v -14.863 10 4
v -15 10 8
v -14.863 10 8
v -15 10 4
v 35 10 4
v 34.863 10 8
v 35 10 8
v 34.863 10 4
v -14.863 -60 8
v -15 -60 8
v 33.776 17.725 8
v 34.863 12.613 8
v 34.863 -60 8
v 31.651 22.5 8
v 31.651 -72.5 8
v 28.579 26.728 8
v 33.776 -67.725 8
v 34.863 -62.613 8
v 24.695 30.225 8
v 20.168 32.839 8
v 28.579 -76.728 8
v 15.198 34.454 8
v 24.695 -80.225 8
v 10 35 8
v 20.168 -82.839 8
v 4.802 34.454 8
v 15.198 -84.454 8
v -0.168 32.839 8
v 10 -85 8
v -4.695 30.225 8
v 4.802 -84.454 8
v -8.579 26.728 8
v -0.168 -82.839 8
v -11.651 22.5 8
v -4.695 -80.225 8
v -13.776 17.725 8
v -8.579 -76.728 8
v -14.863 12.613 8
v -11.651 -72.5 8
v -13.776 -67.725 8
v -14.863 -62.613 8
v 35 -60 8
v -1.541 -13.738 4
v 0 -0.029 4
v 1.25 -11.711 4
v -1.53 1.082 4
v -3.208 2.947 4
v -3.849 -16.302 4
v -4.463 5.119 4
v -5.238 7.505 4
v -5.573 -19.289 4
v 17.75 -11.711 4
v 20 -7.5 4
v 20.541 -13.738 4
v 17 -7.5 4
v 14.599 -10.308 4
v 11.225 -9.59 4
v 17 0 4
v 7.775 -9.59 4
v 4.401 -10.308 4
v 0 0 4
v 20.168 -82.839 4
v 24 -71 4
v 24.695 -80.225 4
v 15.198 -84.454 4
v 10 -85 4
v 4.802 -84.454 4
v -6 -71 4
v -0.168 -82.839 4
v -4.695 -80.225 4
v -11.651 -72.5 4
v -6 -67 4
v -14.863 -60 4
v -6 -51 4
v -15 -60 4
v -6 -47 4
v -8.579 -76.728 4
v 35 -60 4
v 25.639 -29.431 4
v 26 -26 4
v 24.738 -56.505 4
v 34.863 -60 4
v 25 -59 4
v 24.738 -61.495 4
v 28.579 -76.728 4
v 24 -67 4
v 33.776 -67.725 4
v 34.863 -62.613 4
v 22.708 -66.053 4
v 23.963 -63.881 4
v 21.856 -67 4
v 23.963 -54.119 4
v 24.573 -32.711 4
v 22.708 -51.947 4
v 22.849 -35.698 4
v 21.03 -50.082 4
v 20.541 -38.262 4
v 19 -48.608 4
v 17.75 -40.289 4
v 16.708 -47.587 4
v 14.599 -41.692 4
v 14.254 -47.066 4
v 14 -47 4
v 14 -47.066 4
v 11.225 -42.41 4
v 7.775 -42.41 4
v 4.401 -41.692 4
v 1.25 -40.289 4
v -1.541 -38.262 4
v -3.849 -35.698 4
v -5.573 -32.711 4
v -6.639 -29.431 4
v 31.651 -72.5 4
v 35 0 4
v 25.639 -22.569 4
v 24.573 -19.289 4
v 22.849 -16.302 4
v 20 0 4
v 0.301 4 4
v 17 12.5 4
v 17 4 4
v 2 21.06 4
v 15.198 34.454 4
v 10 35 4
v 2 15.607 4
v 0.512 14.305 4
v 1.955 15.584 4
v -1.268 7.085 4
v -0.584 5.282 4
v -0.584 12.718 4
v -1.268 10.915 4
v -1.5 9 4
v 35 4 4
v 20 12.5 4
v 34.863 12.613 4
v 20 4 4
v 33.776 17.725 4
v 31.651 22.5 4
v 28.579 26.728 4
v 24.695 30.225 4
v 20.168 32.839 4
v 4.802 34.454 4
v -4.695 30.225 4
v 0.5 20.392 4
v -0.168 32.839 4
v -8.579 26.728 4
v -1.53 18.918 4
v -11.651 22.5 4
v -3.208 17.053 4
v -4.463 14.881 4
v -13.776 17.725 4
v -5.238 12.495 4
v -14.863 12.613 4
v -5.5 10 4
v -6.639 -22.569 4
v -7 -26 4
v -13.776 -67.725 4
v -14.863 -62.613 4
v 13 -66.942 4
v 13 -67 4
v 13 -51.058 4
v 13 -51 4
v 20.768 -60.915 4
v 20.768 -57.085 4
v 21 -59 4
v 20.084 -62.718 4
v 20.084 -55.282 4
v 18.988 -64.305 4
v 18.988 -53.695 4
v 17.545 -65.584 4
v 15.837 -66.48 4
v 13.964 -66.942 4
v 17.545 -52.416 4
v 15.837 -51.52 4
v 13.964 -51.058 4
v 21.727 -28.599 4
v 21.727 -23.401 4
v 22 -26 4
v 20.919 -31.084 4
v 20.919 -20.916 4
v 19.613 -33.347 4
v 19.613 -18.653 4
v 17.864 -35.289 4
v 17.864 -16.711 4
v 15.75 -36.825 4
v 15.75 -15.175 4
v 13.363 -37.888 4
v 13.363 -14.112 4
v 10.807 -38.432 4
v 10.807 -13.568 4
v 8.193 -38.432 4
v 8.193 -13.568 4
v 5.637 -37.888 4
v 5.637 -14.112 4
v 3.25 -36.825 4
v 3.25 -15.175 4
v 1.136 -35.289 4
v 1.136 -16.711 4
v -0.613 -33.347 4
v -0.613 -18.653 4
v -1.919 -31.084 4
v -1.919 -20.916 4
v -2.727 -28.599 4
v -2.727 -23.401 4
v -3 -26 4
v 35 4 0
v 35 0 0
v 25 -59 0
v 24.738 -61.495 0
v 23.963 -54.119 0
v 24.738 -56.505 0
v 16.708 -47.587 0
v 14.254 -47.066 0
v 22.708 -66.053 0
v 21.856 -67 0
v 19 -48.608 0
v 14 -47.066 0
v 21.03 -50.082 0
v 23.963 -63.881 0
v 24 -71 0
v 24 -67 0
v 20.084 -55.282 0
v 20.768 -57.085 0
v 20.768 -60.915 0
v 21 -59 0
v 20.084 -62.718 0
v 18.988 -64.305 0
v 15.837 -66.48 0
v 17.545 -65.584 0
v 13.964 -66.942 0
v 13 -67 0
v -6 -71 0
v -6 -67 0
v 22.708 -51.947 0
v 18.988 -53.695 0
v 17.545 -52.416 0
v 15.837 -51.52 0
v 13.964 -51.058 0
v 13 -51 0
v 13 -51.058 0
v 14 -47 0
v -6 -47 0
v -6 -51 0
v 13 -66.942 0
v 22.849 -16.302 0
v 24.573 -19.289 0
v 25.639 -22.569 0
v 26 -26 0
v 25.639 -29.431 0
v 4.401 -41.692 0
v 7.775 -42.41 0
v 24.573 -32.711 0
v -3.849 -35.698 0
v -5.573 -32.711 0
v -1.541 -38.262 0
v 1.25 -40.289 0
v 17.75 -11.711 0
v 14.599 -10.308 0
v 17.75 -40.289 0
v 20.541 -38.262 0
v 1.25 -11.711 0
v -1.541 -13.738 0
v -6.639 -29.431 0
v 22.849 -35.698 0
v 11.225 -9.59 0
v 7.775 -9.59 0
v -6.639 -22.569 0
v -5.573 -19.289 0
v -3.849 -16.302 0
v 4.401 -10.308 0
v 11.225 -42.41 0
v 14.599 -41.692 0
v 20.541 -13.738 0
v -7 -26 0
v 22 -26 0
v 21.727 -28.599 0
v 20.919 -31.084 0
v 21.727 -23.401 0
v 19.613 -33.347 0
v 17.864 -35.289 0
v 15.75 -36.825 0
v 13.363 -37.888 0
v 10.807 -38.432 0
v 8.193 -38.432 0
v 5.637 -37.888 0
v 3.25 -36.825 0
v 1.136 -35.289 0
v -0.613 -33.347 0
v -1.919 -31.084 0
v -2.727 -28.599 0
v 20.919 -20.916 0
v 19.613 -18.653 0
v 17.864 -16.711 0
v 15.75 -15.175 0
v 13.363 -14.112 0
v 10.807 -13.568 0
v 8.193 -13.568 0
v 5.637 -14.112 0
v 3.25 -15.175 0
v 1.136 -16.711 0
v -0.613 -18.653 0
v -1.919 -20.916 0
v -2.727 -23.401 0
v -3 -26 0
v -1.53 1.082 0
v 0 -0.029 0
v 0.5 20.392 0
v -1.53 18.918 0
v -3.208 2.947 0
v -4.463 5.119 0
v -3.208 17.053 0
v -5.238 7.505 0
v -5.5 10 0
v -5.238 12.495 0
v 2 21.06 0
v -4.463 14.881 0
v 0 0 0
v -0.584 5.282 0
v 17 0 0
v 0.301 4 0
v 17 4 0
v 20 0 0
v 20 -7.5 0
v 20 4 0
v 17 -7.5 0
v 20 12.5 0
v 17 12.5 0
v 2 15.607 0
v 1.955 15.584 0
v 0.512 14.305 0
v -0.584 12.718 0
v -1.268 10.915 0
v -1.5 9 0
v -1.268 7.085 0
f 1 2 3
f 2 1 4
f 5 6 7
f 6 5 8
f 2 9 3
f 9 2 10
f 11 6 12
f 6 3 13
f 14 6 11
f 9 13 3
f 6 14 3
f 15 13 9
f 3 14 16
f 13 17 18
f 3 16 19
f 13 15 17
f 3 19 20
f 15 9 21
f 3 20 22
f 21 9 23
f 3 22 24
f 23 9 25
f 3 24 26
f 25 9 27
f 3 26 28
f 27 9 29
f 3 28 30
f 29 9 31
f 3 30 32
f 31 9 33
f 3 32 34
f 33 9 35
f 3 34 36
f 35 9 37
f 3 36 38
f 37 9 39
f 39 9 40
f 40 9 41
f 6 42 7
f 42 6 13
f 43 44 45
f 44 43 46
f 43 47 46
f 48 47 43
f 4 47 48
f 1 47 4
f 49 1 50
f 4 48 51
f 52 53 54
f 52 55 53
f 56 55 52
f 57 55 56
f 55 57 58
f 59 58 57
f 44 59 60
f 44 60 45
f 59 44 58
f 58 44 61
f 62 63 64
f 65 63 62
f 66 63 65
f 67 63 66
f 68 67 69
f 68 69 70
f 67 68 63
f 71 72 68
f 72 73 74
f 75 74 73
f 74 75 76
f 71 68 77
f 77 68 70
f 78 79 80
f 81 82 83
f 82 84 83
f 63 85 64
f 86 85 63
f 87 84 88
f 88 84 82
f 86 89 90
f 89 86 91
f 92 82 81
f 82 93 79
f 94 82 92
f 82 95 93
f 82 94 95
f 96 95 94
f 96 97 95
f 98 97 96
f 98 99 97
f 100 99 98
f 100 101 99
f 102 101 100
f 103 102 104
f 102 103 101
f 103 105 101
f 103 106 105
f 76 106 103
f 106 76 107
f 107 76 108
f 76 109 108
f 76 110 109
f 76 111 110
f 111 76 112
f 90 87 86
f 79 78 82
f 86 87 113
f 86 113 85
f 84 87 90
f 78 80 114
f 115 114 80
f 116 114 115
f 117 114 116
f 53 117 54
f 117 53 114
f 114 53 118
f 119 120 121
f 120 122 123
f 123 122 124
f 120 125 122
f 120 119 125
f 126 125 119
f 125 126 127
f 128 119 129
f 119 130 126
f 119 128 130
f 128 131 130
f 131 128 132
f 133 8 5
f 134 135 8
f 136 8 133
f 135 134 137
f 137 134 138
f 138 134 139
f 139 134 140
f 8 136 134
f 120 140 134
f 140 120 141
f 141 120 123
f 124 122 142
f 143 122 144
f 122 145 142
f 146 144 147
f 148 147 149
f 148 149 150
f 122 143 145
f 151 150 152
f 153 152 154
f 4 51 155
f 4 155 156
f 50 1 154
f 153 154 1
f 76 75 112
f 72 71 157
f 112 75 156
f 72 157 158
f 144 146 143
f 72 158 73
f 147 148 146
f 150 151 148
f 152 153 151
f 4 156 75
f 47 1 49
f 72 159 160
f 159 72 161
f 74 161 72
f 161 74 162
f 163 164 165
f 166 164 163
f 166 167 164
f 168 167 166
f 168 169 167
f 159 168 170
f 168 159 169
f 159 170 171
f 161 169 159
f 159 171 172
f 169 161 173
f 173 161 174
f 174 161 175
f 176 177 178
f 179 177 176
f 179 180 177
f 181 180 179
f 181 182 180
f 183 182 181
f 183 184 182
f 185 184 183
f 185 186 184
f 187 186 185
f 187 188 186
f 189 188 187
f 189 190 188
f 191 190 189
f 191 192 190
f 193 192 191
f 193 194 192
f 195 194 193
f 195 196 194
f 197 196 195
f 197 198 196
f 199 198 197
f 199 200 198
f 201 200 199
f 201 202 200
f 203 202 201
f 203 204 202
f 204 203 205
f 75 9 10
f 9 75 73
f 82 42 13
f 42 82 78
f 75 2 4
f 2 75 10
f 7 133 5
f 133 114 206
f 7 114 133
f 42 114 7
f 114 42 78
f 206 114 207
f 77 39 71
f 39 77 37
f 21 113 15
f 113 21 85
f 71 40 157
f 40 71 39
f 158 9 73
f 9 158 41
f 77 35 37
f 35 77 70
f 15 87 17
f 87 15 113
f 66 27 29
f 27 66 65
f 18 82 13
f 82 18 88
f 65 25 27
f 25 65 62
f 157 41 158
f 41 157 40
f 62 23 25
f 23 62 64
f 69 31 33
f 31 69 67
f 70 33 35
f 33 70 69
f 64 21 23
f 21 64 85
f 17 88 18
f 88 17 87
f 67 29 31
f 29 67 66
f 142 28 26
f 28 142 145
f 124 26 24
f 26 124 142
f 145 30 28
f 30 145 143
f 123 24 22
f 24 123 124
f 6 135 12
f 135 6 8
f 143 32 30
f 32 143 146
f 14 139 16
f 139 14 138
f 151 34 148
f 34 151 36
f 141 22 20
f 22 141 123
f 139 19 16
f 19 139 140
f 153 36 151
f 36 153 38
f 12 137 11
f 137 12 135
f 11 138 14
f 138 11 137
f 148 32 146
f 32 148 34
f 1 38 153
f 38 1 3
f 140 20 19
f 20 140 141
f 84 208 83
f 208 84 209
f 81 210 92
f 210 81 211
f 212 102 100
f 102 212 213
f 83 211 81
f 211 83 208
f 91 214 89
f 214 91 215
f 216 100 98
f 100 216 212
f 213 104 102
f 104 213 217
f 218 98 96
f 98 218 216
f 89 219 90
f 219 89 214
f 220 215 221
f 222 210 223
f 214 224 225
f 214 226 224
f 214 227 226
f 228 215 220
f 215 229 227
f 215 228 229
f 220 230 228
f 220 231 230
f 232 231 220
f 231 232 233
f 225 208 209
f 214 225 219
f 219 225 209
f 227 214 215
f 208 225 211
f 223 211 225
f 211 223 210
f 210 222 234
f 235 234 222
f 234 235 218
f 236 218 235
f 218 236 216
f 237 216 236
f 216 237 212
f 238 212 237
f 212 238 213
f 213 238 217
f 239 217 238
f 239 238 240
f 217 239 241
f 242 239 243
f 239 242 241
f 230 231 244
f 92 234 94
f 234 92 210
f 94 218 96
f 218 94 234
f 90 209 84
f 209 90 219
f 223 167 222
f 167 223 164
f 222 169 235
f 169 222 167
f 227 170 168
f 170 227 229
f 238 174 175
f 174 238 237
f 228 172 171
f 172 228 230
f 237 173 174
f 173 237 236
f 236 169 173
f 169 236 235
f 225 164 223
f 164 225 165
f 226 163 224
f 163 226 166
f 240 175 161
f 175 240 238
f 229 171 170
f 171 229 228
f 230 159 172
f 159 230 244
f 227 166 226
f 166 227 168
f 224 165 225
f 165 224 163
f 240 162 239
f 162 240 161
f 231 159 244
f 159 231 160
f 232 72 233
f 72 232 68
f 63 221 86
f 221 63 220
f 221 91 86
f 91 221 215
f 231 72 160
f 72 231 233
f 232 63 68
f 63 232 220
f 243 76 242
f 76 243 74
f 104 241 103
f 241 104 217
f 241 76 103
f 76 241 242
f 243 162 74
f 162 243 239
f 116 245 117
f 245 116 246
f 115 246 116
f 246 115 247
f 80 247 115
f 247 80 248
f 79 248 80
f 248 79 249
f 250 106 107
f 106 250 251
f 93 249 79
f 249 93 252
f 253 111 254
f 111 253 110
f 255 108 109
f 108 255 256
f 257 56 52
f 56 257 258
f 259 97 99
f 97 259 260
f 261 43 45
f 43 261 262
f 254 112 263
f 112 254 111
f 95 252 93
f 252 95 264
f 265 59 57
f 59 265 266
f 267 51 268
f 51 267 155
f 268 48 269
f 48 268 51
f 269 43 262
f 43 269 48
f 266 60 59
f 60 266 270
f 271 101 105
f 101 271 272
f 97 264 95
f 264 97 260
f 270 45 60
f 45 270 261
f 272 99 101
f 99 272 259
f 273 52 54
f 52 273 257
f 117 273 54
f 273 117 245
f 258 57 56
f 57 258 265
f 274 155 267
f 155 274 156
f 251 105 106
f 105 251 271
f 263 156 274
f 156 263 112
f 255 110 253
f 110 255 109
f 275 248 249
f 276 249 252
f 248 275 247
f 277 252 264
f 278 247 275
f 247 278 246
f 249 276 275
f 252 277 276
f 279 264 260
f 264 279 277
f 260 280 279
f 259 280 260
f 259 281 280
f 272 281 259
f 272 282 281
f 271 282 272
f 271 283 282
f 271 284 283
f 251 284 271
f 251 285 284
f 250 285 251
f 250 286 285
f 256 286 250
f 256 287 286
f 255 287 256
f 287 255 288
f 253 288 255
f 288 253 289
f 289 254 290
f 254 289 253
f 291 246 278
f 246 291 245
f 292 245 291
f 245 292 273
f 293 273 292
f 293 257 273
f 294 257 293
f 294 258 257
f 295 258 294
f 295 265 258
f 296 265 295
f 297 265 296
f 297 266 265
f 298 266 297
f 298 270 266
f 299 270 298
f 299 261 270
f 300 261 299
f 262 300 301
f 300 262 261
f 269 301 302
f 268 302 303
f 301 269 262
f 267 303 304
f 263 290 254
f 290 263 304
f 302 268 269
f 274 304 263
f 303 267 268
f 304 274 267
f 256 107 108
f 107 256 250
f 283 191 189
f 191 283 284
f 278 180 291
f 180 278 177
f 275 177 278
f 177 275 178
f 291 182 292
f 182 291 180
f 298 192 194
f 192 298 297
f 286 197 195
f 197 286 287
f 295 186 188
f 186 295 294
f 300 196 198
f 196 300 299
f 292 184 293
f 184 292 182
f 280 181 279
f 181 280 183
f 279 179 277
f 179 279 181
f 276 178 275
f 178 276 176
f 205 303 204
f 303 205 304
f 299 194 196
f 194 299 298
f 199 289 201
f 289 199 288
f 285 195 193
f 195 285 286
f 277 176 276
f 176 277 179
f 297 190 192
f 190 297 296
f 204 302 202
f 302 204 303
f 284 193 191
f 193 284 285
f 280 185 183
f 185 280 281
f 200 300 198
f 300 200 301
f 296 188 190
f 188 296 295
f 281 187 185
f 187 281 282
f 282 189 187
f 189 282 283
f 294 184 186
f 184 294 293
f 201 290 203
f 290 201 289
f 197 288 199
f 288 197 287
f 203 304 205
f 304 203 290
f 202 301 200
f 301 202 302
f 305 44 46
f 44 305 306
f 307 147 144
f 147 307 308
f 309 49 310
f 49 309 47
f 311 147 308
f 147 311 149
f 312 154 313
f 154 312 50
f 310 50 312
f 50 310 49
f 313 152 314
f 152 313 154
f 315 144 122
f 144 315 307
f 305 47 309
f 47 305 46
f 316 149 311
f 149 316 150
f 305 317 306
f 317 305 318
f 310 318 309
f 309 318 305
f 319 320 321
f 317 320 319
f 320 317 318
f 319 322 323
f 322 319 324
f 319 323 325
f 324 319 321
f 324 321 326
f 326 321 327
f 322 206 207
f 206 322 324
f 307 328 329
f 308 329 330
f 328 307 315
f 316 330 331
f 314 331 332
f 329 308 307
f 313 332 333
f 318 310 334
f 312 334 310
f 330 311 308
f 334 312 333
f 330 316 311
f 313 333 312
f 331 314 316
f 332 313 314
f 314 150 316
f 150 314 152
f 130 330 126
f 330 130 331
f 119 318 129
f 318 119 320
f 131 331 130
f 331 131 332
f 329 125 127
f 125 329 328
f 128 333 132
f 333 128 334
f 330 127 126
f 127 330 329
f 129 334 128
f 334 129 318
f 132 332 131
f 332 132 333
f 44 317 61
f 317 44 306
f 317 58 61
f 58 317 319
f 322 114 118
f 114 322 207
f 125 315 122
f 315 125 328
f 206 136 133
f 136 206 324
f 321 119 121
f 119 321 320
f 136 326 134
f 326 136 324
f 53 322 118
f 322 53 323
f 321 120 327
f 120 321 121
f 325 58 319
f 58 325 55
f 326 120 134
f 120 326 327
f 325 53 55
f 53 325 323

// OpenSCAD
//основа
rotate([0,0,90])
translate([-60,-35,4])
union(){  
  cube([70,50,4]);
  translate([0,25,0])
  cylinder(4,25,25);
  translate([70,25,0])
  cylinder(4,25,25);
  

}


union(){ 
//буква n
translate([0,-40,8])
rotate([180,0,90]){
  rotate(-90,0,0)
   translate([-23,46,4])

union(){
difference(){
  translate([10,-65,0]) cylinder(4,12,12); 
  translate([10,-65,0]) cylinder(4,8,8);

translate([10,-78,0]) cube(40);
}
  translate([-1,-77,0]) cube([30,4,4]);
  translate([9,-57,0]) cube([20,4,4]);
}
}
}

//буква О
difference(){
  translate([9.5,-26,0]) cylinder(4,16.5,16.5);
  translate([9.5,-26,0]) cylinder(4,12.5,12.5);
}

//буква t
cube([35,4,4]);
difference(){
  translate([6.5,10,0]) cylinder(4,12,12);
  translate([6.5,9,0]) cylinder(4,8,8);
  translate([0,-5,0]) cube([15,5,4]);
  translate([2,0,0]) cube([17,25,4]);
}
  translate([17,-7.5,0]) cube([3,20,4]);
